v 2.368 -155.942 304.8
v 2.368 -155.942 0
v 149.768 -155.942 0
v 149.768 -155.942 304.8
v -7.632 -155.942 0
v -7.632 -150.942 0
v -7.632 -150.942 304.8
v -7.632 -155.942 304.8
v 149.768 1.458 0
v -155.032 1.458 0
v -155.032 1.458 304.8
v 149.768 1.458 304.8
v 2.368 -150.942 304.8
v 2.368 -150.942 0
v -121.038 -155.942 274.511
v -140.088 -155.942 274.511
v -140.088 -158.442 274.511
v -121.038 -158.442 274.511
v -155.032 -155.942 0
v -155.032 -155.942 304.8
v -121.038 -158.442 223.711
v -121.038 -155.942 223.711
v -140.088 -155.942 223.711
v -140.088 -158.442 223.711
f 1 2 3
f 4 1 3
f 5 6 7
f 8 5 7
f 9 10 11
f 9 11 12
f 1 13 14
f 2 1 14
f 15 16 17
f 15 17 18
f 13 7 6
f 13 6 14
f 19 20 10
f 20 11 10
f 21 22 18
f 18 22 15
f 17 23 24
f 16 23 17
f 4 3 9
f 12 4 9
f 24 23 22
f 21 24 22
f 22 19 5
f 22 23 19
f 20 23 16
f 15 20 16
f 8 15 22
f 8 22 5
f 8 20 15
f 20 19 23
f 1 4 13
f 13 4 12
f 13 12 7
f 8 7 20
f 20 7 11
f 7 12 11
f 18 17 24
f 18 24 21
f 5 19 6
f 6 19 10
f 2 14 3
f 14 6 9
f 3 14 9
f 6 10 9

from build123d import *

# Parameters (mm, degrees)
F0_W     = 304.8
F0_H     = 152.4
F1_DEPTH = 304.8
F3_DEPTH = 5
F4_W     = 19.05
F4_H     = 50.8
F5_DEPTH = 2.5


with BuildPart() as f1:
    # F0 (on Top) → F1 (new body)
    with BuildSketch(Plane.XY):
        with Locations((-2.632114, -74.741666)):
            Rectangle(F0_W, F0_H)
    extrude(amount=F1_DEPTH)

    # F2 (on face) → F3 (join)
    with BuildSketch(Plane.XZ.offset(150.941666)):
        Polygon((-7.632114, 304.8), (-155.032114, 304.8), (-155.032114, 0), (-7.632114, 0), (-7.632114, 5), (-7.632114, 299.8), align=None)
        Polygon((149.767886, 304.8), (2.367886, 304.8), (2.367886, 299.8), (2.367886, 5), (2.367886, 0), (149.767886, 0), align=None)
    extrude(amount=F3_DEPTH)

    # F4 (on face) → F5 (join)
    with BuildSketch(Plane.XZ.offset(155.941666)):
        with Locations((-130.563368, 249.110587)):
            Rectangle(F4_W, F4_H)
    extrude(amount=F5_DEPTH)


solid = f1.part
